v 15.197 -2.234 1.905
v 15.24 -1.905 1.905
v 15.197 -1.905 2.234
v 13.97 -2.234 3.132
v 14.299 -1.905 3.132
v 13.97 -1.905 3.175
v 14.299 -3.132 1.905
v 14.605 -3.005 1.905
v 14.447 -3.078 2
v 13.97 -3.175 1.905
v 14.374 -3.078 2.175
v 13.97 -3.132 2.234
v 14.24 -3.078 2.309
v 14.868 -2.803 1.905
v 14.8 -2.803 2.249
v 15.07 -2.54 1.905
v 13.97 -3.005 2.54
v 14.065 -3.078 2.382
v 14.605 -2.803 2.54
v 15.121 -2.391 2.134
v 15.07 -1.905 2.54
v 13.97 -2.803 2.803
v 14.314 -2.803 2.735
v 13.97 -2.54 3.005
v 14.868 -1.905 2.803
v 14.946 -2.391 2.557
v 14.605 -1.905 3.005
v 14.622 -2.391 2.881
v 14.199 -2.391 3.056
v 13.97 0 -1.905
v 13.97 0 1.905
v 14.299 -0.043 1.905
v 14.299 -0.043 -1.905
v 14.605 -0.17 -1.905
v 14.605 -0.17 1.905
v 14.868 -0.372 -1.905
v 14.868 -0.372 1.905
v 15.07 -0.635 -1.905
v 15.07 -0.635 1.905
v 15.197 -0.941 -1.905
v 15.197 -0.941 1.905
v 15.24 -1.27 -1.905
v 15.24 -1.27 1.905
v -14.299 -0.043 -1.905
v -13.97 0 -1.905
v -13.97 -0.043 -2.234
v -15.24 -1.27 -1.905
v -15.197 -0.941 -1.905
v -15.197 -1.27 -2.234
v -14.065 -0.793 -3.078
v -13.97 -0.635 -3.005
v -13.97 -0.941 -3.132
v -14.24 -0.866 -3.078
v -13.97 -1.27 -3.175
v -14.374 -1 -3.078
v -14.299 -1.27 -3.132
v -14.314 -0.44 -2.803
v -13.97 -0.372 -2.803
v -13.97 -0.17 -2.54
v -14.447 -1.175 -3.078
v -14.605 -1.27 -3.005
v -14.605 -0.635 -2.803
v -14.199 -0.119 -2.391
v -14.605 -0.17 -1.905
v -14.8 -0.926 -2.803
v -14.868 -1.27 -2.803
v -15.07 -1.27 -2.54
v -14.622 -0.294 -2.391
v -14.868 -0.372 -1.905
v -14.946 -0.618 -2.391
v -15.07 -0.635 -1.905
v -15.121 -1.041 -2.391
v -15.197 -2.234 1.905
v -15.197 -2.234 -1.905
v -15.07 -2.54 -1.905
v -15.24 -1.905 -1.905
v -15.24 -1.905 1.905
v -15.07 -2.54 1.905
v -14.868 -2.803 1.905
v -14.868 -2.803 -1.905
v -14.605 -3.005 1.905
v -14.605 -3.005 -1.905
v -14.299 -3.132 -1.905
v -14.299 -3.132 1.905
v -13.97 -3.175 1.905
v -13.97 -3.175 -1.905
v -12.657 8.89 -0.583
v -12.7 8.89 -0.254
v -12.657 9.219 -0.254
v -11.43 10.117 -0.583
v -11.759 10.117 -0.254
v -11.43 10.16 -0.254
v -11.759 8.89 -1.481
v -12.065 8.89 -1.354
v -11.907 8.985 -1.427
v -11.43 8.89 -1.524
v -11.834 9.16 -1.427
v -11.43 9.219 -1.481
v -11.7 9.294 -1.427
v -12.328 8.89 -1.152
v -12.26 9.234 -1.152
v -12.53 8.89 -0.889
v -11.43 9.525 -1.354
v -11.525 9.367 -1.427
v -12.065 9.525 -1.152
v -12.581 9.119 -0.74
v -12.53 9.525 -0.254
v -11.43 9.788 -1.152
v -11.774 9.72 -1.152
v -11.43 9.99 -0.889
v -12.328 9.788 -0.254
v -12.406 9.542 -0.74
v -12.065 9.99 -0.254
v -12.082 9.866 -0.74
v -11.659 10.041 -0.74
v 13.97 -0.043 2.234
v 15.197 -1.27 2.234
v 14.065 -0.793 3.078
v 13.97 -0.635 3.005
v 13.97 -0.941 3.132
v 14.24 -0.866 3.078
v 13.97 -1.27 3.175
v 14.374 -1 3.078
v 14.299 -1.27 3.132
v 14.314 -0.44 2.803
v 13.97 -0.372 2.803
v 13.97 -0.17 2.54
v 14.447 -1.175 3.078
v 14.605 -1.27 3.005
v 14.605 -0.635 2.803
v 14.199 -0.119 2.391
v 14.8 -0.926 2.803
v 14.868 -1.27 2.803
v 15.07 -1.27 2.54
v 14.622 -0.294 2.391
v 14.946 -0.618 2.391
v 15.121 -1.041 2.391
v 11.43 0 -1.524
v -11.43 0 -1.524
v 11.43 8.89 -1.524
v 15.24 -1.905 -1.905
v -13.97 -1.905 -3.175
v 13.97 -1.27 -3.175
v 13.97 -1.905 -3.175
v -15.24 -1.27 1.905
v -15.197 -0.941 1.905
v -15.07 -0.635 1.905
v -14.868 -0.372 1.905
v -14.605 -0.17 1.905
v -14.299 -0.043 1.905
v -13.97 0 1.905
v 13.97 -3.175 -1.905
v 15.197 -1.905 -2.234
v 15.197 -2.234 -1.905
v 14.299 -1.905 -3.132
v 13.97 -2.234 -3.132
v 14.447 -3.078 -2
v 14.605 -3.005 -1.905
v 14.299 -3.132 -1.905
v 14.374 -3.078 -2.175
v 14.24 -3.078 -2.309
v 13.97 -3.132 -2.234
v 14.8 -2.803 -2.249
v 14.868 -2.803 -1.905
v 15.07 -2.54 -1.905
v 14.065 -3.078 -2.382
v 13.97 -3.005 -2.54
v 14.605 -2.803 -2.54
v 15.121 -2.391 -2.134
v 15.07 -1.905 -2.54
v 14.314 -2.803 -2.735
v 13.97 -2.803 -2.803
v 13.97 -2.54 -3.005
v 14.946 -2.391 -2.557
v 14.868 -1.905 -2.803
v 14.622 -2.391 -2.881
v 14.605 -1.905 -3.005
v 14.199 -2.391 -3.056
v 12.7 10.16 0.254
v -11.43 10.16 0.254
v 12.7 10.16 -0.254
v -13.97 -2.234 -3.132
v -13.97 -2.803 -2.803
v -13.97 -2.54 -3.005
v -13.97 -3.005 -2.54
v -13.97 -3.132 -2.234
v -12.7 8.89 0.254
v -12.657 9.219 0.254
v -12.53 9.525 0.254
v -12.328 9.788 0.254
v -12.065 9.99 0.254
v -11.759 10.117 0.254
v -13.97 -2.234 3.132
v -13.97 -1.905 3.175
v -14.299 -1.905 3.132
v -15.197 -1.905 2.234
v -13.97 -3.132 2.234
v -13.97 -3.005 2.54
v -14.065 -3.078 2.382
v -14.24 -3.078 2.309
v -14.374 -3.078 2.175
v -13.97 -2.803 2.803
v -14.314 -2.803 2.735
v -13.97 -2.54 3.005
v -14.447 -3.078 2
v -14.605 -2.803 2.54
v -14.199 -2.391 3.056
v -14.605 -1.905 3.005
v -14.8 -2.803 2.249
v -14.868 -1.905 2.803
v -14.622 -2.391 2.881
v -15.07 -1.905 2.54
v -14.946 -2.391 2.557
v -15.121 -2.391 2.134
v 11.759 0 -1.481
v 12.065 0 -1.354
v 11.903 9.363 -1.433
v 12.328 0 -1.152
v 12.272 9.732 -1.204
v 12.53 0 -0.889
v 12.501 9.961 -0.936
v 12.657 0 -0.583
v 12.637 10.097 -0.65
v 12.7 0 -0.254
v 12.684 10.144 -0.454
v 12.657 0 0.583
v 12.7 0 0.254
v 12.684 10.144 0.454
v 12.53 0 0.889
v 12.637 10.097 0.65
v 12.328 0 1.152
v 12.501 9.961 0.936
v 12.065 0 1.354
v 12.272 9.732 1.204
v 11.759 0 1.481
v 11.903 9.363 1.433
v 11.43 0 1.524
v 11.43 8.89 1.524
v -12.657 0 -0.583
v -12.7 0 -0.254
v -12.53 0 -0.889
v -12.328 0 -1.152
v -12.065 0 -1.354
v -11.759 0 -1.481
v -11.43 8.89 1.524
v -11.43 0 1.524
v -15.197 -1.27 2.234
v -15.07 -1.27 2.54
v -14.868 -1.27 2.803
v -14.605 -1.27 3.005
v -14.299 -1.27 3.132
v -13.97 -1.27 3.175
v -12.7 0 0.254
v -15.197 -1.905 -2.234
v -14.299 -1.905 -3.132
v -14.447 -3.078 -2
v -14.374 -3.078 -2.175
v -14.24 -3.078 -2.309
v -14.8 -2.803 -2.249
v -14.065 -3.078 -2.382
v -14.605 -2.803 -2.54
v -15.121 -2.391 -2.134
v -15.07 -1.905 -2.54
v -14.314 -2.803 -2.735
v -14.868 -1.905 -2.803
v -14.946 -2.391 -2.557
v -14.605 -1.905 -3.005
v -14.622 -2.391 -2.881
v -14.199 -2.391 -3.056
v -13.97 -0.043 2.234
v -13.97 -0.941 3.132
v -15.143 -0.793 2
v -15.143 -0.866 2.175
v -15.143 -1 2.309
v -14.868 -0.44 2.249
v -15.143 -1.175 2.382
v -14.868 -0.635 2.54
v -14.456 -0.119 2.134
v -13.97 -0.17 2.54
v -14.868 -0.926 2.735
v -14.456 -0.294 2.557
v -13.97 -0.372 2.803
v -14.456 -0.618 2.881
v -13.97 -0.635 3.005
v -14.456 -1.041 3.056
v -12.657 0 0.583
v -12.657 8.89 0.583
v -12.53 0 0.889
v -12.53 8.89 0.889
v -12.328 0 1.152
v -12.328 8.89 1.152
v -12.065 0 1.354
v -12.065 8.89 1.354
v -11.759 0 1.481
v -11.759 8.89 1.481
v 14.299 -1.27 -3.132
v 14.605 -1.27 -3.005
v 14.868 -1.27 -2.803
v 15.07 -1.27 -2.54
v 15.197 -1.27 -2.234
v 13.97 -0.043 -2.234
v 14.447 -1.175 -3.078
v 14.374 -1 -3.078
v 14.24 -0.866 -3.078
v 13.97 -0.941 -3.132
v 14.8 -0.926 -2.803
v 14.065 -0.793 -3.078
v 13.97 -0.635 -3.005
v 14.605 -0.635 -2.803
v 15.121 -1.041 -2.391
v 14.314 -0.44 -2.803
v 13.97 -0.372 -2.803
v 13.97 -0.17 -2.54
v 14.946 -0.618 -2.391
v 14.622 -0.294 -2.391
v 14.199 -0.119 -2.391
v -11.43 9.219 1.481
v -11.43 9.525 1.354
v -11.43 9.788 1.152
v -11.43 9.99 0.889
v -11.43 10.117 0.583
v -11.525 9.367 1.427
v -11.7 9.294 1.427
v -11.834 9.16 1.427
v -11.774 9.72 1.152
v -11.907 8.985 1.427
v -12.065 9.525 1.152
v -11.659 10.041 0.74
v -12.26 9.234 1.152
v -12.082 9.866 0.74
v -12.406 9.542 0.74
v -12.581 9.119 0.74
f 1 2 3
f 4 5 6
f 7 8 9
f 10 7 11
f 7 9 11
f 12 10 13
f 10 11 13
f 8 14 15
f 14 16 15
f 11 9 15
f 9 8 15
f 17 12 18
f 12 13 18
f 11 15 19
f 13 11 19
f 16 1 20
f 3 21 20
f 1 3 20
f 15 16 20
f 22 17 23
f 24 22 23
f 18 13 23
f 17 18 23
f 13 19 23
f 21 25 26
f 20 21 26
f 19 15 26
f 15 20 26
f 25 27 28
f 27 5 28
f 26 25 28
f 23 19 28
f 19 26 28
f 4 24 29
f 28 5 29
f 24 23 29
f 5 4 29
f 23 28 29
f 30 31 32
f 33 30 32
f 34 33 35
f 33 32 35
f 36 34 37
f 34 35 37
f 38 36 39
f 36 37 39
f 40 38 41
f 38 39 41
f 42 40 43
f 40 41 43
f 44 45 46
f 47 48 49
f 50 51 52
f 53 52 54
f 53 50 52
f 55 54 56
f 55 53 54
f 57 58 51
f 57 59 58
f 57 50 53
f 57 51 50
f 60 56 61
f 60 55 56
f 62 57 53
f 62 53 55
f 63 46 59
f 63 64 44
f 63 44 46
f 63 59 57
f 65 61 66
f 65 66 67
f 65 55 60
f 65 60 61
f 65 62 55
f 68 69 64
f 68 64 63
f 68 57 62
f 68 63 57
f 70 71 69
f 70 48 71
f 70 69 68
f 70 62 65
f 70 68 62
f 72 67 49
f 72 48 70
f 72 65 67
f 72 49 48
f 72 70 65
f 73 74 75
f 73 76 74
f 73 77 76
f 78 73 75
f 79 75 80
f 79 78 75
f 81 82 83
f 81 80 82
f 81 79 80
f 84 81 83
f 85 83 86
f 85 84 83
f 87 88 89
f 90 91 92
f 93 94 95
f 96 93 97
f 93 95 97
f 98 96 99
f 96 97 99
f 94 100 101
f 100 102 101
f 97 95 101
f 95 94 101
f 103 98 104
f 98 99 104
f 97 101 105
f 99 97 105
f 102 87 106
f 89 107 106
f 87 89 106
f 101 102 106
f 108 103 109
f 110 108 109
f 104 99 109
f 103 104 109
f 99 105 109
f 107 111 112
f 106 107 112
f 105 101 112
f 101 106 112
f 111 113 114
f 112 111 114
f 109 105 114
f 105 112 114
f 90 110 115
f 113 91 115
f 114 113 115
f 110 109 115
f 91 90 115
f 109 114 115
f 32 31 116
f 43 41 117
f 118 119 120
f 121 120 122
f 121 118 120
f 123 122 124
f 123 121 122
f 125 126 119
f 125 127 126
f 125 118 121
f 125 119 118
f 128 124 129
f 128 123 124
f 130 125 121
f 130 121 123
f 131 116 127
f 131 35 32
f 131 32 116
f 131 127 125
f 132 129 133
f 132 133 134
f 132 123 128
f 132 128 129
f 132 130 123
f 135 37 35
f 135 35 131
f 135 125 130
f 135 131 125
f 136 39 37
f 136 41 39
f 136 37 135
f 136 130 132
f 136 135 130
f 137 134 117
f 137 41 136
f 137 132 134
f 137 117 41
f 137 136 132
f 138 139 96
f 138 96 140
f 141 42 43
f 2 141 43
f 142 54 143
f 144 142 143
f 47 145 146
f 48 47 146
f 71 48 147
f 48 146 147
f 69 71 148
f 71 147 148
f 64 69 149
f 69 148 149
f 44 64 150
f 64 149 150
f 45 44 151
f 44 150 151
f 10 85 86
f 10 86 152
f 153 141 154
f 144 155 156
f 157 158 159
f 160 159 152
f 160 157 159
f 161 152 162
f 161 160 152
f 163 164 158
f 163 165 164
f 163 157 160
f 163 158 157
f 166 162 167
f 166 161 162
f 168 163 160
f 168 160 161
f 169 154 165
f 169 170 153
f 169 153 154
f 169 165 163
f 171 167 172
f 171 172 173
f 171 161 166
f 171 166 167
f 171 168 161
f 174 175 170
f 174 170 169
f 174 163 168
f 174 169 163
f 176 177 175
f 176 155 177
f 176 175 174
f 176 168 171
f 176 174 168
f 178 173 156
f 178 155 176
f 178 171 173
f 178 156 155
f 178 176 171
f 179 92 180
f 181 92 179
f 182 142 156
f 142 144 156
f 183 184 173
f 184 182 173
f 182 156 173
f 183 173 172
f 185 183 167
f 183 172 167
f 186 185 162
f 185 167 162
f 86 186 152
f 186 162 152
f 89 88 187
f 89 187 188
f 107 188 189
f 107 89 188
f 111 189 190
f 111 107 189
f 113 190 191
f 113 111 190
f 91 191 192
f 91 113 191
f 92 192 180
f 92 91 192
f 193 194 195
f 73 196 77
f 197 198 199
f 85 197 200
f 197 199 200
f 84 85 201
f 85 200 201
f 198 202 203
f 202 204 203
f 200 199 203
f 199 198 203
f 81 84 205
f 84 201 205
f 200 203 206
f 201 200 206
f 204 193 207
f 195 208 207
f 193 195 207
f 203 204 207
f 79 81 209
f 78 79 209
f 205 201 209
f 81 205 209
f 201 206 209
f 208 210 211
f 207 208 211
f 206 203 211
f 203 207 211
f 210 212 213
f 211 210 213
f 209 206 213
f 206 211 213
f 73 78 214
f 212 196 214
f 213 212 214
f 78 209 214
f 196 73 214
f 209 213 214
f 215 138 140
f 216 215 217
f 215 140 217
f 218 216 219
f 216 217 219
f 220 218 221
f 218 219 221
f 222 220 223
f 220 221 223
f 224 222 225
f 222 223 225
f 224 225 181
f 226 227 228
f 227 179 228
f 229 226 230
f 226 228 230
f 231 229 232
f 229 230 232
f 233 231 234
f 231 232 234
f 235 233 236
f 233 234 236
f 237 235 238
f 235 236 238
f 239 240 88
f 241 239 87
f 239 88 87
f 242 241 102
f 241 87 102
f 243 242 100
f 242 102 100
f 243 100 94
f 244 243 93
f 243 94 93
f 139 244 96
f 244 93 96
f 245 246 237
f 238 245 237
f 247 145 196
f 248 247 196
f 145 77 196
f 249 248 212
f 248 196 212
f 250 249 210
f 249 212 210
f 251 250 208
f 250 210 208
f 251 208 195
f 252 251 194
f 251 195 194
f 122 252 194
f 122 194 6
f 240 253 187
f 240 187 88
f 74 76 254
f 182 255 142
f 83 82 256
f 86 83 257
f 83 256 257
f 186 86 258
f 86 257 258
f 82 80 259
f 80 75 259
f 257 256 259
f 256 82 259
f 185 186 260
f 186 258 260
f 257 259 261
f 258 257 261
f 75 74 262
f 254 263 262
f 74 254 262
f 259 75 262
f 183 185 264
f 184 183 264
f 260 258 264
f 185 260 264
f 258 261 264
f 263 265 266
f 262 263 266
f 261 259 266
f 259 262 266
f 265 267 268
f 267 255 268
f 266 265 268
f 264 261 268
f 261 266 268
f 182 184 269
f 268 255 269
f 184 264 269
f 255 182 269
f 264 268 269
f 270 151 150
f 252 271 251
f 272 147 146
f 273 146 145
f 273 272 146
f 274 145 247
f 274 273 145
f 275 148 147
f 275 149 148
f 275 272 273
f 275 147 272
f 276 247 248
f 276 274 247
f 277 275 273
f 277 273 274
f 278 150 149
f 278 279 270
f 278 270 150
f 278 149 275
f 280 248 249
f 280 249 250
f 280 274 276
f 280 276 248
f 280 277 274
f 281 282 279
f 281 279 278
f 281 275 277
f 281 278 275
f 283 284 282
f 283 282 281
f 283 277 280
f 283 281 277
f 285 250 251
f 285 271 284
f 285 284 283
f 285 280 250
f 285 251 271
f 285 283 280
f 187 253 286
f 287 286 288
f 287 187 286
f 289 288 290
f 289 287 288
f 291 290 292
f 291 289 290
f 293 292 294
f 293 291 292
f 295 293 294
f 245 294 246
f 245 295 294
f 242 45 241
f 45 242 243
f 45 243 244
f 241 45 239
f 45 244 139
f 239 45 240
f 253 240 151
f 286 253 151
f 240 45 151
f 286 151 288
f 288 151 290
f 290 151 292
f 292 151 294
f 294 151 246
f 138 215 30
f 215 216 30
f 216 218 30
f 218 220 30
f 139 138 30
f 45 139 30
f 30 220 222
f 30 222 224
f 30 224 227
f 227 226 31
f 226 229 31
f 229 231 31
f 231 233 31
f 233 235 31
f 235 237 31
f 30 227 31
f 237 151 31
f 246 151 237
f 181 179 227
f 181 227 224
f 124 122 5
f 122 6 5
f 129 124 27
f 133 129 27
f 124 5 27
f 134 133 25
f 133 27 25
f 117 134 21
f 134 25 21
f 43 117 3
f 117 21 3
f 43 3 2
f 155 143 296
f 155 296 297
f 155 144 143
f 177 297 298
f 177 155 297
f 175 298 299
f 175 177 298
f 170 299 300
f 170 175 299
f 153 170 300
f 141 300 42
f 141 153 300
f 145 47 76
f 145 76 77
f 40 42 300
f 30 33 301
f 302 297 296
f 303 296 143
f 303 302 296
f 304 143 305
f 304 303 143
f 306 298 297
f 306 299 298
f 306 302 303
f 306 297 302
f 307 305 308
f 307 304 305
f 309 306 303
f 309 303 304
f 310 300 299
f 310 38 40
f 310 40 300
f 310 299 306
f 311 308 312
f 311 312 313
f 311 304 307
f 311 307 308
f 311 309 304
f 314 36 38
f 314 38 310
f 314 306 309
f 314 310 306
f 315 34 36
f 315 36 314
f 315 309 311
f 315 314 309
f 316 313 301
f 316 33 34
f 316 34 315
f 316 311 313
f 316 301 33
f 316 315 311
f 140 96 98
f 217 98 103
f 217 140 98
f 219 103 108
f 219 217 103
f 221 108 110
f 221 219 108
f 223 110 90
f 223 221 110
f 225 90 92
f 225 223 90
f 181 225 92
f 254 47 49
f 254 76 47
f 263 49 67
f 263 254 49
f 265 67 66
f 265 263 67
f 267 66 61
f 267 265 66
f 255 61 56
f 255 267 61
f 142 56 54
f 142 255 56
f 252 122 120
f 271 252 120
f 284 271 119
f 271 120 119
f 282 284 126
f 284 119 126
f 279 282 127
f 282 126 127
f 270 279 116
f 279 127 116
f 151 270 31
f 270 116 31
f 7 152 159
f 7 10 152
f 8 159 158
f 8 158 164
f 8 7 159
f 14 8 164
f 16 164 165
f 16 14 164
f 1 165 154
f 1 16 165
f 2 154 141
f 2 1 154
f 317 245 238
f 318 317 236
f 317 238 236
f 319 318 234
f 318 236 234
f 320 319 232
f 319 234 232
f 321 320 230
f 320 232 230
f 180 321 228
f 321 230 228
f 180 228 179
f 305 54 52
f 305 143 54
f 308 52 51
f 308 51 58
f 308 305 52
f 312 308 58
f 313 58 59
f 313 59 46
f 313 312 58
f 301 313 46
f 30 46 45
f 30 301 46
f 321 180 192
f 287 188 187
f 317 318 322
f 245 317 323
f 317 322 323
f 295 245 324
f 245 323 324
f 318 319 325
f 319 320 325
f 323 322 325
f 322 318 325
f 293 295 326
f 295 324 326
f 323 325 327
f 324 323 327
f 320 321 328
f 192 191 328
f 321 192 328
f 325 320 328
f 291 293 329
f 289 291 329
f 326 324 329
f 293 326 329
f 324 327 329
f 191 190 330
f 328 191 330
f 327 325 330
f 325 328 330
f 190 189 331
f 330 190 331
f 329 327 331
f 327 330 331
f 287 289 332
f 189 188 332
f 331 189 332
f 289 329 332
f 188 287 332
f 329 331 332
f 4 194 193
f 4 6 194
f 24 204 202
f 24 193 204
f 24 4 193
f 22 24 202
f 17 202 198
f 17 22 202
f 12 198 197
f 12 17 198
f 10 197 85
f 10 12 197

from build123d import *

# Parameters (mm, degrees)
SKETCH1_W           = 25.4
SKETCH1_H           = 3.048
BOSS_EXTRUDE1_DEPTH = 10.16
SKETCH2_W           = 30.48
SKETCH2_H           = 6.35
BOSS_EXTRUDE2_DEPTH = 3.175
FILLET1_R           = 1.27


with BuildPart() as part:
    # Sketch1 → Boss-Extrude1 (new body)
    with BuildSketch(Plane(origin=(0, 0, 0), x_dir=(1, 0, 0), z_dir=(0, 1, 0))):
        Rectangle(SKETCH1_W, SKETCH1_H)
    extrude(amount=BOSS_EXTRUDE1_DEPTH)

    # Sketch2 → Boss-Extrude2 (add)
    with BuildSketch(Plane.XZ):
        Rectangle(SKETCH2_W, SKETCH2_H)
    extrude(amount=BOSS_EXTRUDE2_DEPTH)

    # Fillet1
    fillet1_edges = [part.edges().sort_by_distance(p)[0] for p in [
        (-12.7, 10.16, 0),
        (15.24, 0, 0),
        (15.24, -1.5875, -3.175),
        (0, 0, 3.175),
        (15.24, -1.5875, 3.175),
        (-15.24, 0, 0),
        (-15.24, -1.5875, 3.175),
        (0, 0, -3.175),
        (-15.24, -1.5875, -3.175),
        (15.24, -3.175, 0),
        (0, -3.175, 3.175),
        (-15.24, -3.175, 0),
        (0, 10.16, 1.524),
        (0, -3.175, -3.175),
        (12.7, 5.08, 1.524),
        (-12.7, 5.08, 1.524),
        (-12.7, 5.08, -1.524),
        (12.7, 5.08, -1.524),
        (0, 10.16, -1.524),
    ]]
    fillet(fillet1_edges, radius=FILLET1_R)


solid = part.part
